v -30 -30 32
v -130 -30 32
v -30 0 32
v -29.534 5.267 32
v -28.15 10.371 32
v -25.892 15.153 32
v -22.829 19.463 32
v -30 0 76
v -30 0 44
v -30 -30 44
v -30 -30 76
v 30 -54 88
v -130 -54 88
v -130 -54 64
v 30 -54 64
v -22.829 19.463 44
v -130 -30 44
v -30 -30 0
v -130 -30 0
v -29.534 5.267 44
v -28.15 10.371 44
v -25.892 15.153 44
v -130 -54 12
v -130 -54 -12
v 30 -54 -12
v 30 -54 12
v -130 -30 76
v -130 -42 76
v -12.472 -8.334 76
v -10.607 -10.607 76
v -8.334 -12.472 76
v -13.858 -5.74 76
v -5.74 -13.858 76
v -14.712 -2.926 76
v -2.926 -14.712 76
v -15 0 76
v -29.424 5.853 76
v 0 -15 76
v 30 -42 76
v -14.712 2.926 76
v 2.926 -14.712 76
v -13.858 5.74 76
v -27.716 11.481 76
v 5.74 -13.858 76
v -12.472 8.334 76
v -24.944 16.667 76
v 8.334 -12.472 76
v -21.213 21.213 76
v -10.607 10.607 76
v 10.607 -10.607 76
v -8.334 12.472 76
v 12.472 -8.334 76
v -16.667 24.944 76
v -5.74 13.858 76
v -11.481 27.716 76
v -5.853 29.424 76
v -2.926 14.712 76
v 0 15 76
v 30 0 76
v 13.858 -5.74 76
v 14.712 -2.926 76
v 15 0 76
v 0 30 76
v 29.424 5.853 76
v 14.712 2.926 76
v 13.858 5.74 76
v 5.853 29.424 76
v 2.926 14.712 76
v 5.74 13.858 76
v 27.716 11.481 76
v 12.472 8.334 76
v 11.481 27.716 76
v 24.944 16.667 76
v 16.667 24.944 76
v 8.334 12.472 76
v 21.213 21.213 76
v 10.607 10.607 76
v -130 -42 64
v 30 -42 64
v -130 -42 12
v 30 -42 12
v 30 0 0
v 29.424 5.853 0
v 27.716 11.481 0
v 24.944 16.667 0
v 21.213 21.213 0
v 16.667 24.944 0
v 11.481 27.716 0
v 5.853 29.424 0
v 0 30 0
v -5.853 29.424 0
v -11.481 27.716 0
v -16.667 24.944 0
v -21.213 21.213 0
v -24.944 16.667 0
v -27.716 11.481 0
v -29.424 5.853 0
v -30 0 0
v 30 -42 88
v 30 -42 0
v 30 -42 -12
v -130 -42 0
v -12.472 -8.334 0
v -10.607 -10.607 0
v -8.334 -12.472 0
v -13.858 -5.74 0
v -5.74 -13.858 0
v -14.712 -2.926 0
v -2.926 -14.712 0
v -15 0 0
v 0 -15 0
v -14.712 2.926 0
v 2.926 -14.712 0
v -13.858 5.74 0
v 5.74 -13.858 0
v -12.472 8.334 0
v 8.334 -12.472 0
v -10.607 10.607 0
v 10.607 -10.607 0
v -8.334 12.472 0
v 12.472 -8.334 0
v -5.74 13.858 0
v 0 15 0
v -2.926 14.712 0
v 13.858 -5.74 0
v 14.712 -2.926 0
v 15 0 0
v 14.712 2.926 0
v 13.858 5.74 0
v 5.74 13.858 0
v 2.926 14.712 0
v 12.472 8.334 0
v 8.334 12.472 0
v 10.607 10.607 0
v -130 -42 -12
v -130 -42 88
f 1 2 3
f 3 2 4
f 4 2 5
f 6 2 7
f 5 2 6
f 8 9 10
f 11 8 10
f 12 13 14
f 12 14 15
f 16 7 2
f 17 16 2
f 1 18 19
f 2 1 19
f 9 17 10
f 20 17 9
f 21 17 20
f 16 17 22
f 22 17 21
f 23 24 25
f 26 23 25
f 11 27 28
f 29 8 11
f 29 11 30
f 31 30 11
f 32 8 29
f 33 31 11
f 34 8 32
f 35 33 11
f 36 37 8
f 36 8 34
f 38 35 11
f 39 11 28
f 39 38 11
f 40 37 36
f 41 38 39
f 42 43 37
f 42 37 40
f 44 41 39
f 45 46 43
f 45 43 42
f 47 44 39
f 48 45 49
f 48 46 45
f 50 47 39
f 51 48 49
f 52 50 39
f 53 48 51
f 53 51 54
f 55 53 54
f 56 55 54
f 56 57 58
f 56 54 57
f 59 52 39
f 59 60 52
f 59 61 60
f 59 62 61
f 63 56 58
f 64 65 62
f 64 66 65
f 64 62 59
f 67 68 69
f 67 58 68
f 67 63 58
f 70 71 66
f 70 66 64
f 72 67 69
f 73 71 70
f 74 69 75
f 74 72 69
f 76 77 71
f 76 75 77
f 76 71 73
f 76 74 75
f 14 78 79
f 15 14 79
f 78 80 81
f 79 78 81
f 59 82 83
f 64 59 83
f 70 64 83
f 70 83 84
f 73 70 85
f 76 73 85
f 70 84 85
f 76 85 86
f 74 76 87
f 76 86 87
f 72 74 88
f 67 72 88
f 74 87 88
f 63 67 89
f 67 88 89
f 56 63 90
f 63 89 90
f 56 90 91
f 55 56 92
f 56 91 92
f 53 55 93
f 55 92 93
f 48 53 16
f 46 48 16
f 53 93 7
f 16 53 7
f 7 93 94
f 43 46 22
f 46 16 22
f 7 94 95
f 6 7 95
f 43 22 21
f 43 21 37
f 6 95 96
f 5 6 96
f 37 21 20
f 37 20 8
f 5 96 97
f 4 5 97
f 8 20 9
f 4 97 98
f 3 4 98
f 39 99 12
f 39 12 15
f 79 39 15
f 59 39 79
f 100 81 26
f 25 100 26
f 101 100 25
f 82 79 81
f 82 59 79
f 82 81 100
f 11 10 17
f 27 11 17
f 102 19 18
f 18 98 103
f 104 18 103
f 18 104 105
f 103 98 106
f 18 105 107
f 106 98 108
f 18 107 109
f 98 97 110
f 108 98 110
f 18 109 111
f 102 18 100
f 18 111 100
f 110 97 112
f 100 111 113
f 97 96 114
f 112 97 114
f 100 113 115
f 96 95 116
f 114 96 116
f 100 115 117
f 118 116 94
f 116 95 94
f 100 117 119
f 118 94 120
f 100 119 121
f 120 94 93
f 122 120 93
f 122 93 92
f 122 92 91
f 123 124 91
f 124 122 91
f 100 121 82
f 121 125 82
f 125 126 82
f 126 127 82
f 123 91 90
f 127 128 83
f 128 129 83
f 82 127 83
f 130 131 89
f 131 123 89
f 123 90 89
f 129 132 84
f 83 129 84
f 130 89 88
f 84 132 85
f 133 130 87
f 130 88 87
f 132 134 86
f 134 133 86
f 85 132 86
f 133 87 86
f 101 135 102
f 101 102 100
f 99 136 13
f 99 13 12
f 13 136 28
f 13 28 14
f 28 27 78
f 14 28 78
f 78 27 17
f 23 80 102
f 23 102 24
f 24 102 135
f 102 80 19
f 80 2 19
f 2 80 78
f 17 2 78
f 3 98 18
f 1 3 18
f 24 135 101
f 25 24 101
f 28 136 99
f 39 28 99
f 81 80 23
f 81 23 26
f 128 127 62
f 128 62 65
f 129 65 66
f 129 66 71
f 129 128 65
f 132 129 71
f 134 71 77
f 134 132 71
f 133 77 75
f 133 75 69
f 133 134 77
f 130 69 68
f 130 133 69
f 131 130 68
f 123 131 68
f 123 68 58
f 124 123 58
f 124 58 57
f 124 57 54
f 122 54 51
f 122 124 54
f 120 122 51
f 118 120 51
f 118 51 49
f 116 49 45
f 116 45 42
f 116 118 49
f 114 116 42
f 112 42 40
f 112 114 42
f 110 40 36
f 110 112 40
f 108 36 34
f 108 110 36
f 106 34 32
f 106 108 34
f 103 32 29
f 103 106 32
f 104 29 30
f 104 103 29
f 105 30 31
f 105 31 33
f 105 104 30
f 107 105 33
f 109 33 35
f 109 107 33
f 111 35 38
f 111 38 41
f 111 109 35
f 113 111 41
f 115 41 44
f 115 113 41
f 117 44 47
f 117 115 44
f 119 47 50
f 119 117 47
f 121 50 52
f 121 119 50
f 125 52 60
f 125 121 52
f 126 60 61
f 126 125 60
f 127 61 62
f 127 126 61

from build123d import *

# Parameters (mm, degrees)
SKETCH1_R           = 15
BOSS_EXTRUDE1_DEPTH = 76
SKETCH2_W           = 160
SKETCH2_H           = 24
BOSS_EXTRUDE2_DEPTH = 12
RIB1_START          = -6
RIB1_DEPTH          = 12


# Read off the part's stored shape, not the designer's step: Rib1
with BuildPart() as part:
    # Sketch1 → Boss-Extrude1 (new body)
    with BuildSketch(Plane.XY):
        with BuildLine():
            Line((-30, 0), (-30, -30))
            Line((-30, -30), (-130, -30))
            Line((-130, -30), (-130, -42))
            Line((-130, -42), (30, -42))
            Line((30, -42), (30, 0))
            ThreePointArc((30, 0), (0, 30), (-30, 0))
        make_face()
        Circle(SKETCH1_R, mode=Mode.SUBTRACT)
    extrude(amount=BOSS_EXTRUDE1_DEPTH)

    # Sketch2 → Boss-Extrude2 (add)
    with BuildSketch(Plane.XZ.offset(42)):
        with Locations((-50, 76)):
            Rectangle(SKETCH2_W, SKETCH2_H)
    boss_extrude2 = extrude(amount=BOSS_EXTRUDE2_DEPTH)

    # Mirror1: Boss-Extrude2 across plane
    add(boss_extrude2.mirror(Plane.XY.offset(38)))

    # Rib1 outline → Rib1 (add)
    with BuildSketch(Plane.XY.offset(38).offset(RIB1_START)):
        with BuildLine():
            Line((-22.829268293, 19.463414634), (-130, -30))
            Line((-130, -30), (-30, -30))
            Line((-30, -30), (-30, 0))
            ThreePointArc((-30, 0), (-28.150293505, 10.371160765), (-22.829268293, 19.463414634))
        make_face()
    extrude(amount=RIB1_DEPTH)


solid = part.part
